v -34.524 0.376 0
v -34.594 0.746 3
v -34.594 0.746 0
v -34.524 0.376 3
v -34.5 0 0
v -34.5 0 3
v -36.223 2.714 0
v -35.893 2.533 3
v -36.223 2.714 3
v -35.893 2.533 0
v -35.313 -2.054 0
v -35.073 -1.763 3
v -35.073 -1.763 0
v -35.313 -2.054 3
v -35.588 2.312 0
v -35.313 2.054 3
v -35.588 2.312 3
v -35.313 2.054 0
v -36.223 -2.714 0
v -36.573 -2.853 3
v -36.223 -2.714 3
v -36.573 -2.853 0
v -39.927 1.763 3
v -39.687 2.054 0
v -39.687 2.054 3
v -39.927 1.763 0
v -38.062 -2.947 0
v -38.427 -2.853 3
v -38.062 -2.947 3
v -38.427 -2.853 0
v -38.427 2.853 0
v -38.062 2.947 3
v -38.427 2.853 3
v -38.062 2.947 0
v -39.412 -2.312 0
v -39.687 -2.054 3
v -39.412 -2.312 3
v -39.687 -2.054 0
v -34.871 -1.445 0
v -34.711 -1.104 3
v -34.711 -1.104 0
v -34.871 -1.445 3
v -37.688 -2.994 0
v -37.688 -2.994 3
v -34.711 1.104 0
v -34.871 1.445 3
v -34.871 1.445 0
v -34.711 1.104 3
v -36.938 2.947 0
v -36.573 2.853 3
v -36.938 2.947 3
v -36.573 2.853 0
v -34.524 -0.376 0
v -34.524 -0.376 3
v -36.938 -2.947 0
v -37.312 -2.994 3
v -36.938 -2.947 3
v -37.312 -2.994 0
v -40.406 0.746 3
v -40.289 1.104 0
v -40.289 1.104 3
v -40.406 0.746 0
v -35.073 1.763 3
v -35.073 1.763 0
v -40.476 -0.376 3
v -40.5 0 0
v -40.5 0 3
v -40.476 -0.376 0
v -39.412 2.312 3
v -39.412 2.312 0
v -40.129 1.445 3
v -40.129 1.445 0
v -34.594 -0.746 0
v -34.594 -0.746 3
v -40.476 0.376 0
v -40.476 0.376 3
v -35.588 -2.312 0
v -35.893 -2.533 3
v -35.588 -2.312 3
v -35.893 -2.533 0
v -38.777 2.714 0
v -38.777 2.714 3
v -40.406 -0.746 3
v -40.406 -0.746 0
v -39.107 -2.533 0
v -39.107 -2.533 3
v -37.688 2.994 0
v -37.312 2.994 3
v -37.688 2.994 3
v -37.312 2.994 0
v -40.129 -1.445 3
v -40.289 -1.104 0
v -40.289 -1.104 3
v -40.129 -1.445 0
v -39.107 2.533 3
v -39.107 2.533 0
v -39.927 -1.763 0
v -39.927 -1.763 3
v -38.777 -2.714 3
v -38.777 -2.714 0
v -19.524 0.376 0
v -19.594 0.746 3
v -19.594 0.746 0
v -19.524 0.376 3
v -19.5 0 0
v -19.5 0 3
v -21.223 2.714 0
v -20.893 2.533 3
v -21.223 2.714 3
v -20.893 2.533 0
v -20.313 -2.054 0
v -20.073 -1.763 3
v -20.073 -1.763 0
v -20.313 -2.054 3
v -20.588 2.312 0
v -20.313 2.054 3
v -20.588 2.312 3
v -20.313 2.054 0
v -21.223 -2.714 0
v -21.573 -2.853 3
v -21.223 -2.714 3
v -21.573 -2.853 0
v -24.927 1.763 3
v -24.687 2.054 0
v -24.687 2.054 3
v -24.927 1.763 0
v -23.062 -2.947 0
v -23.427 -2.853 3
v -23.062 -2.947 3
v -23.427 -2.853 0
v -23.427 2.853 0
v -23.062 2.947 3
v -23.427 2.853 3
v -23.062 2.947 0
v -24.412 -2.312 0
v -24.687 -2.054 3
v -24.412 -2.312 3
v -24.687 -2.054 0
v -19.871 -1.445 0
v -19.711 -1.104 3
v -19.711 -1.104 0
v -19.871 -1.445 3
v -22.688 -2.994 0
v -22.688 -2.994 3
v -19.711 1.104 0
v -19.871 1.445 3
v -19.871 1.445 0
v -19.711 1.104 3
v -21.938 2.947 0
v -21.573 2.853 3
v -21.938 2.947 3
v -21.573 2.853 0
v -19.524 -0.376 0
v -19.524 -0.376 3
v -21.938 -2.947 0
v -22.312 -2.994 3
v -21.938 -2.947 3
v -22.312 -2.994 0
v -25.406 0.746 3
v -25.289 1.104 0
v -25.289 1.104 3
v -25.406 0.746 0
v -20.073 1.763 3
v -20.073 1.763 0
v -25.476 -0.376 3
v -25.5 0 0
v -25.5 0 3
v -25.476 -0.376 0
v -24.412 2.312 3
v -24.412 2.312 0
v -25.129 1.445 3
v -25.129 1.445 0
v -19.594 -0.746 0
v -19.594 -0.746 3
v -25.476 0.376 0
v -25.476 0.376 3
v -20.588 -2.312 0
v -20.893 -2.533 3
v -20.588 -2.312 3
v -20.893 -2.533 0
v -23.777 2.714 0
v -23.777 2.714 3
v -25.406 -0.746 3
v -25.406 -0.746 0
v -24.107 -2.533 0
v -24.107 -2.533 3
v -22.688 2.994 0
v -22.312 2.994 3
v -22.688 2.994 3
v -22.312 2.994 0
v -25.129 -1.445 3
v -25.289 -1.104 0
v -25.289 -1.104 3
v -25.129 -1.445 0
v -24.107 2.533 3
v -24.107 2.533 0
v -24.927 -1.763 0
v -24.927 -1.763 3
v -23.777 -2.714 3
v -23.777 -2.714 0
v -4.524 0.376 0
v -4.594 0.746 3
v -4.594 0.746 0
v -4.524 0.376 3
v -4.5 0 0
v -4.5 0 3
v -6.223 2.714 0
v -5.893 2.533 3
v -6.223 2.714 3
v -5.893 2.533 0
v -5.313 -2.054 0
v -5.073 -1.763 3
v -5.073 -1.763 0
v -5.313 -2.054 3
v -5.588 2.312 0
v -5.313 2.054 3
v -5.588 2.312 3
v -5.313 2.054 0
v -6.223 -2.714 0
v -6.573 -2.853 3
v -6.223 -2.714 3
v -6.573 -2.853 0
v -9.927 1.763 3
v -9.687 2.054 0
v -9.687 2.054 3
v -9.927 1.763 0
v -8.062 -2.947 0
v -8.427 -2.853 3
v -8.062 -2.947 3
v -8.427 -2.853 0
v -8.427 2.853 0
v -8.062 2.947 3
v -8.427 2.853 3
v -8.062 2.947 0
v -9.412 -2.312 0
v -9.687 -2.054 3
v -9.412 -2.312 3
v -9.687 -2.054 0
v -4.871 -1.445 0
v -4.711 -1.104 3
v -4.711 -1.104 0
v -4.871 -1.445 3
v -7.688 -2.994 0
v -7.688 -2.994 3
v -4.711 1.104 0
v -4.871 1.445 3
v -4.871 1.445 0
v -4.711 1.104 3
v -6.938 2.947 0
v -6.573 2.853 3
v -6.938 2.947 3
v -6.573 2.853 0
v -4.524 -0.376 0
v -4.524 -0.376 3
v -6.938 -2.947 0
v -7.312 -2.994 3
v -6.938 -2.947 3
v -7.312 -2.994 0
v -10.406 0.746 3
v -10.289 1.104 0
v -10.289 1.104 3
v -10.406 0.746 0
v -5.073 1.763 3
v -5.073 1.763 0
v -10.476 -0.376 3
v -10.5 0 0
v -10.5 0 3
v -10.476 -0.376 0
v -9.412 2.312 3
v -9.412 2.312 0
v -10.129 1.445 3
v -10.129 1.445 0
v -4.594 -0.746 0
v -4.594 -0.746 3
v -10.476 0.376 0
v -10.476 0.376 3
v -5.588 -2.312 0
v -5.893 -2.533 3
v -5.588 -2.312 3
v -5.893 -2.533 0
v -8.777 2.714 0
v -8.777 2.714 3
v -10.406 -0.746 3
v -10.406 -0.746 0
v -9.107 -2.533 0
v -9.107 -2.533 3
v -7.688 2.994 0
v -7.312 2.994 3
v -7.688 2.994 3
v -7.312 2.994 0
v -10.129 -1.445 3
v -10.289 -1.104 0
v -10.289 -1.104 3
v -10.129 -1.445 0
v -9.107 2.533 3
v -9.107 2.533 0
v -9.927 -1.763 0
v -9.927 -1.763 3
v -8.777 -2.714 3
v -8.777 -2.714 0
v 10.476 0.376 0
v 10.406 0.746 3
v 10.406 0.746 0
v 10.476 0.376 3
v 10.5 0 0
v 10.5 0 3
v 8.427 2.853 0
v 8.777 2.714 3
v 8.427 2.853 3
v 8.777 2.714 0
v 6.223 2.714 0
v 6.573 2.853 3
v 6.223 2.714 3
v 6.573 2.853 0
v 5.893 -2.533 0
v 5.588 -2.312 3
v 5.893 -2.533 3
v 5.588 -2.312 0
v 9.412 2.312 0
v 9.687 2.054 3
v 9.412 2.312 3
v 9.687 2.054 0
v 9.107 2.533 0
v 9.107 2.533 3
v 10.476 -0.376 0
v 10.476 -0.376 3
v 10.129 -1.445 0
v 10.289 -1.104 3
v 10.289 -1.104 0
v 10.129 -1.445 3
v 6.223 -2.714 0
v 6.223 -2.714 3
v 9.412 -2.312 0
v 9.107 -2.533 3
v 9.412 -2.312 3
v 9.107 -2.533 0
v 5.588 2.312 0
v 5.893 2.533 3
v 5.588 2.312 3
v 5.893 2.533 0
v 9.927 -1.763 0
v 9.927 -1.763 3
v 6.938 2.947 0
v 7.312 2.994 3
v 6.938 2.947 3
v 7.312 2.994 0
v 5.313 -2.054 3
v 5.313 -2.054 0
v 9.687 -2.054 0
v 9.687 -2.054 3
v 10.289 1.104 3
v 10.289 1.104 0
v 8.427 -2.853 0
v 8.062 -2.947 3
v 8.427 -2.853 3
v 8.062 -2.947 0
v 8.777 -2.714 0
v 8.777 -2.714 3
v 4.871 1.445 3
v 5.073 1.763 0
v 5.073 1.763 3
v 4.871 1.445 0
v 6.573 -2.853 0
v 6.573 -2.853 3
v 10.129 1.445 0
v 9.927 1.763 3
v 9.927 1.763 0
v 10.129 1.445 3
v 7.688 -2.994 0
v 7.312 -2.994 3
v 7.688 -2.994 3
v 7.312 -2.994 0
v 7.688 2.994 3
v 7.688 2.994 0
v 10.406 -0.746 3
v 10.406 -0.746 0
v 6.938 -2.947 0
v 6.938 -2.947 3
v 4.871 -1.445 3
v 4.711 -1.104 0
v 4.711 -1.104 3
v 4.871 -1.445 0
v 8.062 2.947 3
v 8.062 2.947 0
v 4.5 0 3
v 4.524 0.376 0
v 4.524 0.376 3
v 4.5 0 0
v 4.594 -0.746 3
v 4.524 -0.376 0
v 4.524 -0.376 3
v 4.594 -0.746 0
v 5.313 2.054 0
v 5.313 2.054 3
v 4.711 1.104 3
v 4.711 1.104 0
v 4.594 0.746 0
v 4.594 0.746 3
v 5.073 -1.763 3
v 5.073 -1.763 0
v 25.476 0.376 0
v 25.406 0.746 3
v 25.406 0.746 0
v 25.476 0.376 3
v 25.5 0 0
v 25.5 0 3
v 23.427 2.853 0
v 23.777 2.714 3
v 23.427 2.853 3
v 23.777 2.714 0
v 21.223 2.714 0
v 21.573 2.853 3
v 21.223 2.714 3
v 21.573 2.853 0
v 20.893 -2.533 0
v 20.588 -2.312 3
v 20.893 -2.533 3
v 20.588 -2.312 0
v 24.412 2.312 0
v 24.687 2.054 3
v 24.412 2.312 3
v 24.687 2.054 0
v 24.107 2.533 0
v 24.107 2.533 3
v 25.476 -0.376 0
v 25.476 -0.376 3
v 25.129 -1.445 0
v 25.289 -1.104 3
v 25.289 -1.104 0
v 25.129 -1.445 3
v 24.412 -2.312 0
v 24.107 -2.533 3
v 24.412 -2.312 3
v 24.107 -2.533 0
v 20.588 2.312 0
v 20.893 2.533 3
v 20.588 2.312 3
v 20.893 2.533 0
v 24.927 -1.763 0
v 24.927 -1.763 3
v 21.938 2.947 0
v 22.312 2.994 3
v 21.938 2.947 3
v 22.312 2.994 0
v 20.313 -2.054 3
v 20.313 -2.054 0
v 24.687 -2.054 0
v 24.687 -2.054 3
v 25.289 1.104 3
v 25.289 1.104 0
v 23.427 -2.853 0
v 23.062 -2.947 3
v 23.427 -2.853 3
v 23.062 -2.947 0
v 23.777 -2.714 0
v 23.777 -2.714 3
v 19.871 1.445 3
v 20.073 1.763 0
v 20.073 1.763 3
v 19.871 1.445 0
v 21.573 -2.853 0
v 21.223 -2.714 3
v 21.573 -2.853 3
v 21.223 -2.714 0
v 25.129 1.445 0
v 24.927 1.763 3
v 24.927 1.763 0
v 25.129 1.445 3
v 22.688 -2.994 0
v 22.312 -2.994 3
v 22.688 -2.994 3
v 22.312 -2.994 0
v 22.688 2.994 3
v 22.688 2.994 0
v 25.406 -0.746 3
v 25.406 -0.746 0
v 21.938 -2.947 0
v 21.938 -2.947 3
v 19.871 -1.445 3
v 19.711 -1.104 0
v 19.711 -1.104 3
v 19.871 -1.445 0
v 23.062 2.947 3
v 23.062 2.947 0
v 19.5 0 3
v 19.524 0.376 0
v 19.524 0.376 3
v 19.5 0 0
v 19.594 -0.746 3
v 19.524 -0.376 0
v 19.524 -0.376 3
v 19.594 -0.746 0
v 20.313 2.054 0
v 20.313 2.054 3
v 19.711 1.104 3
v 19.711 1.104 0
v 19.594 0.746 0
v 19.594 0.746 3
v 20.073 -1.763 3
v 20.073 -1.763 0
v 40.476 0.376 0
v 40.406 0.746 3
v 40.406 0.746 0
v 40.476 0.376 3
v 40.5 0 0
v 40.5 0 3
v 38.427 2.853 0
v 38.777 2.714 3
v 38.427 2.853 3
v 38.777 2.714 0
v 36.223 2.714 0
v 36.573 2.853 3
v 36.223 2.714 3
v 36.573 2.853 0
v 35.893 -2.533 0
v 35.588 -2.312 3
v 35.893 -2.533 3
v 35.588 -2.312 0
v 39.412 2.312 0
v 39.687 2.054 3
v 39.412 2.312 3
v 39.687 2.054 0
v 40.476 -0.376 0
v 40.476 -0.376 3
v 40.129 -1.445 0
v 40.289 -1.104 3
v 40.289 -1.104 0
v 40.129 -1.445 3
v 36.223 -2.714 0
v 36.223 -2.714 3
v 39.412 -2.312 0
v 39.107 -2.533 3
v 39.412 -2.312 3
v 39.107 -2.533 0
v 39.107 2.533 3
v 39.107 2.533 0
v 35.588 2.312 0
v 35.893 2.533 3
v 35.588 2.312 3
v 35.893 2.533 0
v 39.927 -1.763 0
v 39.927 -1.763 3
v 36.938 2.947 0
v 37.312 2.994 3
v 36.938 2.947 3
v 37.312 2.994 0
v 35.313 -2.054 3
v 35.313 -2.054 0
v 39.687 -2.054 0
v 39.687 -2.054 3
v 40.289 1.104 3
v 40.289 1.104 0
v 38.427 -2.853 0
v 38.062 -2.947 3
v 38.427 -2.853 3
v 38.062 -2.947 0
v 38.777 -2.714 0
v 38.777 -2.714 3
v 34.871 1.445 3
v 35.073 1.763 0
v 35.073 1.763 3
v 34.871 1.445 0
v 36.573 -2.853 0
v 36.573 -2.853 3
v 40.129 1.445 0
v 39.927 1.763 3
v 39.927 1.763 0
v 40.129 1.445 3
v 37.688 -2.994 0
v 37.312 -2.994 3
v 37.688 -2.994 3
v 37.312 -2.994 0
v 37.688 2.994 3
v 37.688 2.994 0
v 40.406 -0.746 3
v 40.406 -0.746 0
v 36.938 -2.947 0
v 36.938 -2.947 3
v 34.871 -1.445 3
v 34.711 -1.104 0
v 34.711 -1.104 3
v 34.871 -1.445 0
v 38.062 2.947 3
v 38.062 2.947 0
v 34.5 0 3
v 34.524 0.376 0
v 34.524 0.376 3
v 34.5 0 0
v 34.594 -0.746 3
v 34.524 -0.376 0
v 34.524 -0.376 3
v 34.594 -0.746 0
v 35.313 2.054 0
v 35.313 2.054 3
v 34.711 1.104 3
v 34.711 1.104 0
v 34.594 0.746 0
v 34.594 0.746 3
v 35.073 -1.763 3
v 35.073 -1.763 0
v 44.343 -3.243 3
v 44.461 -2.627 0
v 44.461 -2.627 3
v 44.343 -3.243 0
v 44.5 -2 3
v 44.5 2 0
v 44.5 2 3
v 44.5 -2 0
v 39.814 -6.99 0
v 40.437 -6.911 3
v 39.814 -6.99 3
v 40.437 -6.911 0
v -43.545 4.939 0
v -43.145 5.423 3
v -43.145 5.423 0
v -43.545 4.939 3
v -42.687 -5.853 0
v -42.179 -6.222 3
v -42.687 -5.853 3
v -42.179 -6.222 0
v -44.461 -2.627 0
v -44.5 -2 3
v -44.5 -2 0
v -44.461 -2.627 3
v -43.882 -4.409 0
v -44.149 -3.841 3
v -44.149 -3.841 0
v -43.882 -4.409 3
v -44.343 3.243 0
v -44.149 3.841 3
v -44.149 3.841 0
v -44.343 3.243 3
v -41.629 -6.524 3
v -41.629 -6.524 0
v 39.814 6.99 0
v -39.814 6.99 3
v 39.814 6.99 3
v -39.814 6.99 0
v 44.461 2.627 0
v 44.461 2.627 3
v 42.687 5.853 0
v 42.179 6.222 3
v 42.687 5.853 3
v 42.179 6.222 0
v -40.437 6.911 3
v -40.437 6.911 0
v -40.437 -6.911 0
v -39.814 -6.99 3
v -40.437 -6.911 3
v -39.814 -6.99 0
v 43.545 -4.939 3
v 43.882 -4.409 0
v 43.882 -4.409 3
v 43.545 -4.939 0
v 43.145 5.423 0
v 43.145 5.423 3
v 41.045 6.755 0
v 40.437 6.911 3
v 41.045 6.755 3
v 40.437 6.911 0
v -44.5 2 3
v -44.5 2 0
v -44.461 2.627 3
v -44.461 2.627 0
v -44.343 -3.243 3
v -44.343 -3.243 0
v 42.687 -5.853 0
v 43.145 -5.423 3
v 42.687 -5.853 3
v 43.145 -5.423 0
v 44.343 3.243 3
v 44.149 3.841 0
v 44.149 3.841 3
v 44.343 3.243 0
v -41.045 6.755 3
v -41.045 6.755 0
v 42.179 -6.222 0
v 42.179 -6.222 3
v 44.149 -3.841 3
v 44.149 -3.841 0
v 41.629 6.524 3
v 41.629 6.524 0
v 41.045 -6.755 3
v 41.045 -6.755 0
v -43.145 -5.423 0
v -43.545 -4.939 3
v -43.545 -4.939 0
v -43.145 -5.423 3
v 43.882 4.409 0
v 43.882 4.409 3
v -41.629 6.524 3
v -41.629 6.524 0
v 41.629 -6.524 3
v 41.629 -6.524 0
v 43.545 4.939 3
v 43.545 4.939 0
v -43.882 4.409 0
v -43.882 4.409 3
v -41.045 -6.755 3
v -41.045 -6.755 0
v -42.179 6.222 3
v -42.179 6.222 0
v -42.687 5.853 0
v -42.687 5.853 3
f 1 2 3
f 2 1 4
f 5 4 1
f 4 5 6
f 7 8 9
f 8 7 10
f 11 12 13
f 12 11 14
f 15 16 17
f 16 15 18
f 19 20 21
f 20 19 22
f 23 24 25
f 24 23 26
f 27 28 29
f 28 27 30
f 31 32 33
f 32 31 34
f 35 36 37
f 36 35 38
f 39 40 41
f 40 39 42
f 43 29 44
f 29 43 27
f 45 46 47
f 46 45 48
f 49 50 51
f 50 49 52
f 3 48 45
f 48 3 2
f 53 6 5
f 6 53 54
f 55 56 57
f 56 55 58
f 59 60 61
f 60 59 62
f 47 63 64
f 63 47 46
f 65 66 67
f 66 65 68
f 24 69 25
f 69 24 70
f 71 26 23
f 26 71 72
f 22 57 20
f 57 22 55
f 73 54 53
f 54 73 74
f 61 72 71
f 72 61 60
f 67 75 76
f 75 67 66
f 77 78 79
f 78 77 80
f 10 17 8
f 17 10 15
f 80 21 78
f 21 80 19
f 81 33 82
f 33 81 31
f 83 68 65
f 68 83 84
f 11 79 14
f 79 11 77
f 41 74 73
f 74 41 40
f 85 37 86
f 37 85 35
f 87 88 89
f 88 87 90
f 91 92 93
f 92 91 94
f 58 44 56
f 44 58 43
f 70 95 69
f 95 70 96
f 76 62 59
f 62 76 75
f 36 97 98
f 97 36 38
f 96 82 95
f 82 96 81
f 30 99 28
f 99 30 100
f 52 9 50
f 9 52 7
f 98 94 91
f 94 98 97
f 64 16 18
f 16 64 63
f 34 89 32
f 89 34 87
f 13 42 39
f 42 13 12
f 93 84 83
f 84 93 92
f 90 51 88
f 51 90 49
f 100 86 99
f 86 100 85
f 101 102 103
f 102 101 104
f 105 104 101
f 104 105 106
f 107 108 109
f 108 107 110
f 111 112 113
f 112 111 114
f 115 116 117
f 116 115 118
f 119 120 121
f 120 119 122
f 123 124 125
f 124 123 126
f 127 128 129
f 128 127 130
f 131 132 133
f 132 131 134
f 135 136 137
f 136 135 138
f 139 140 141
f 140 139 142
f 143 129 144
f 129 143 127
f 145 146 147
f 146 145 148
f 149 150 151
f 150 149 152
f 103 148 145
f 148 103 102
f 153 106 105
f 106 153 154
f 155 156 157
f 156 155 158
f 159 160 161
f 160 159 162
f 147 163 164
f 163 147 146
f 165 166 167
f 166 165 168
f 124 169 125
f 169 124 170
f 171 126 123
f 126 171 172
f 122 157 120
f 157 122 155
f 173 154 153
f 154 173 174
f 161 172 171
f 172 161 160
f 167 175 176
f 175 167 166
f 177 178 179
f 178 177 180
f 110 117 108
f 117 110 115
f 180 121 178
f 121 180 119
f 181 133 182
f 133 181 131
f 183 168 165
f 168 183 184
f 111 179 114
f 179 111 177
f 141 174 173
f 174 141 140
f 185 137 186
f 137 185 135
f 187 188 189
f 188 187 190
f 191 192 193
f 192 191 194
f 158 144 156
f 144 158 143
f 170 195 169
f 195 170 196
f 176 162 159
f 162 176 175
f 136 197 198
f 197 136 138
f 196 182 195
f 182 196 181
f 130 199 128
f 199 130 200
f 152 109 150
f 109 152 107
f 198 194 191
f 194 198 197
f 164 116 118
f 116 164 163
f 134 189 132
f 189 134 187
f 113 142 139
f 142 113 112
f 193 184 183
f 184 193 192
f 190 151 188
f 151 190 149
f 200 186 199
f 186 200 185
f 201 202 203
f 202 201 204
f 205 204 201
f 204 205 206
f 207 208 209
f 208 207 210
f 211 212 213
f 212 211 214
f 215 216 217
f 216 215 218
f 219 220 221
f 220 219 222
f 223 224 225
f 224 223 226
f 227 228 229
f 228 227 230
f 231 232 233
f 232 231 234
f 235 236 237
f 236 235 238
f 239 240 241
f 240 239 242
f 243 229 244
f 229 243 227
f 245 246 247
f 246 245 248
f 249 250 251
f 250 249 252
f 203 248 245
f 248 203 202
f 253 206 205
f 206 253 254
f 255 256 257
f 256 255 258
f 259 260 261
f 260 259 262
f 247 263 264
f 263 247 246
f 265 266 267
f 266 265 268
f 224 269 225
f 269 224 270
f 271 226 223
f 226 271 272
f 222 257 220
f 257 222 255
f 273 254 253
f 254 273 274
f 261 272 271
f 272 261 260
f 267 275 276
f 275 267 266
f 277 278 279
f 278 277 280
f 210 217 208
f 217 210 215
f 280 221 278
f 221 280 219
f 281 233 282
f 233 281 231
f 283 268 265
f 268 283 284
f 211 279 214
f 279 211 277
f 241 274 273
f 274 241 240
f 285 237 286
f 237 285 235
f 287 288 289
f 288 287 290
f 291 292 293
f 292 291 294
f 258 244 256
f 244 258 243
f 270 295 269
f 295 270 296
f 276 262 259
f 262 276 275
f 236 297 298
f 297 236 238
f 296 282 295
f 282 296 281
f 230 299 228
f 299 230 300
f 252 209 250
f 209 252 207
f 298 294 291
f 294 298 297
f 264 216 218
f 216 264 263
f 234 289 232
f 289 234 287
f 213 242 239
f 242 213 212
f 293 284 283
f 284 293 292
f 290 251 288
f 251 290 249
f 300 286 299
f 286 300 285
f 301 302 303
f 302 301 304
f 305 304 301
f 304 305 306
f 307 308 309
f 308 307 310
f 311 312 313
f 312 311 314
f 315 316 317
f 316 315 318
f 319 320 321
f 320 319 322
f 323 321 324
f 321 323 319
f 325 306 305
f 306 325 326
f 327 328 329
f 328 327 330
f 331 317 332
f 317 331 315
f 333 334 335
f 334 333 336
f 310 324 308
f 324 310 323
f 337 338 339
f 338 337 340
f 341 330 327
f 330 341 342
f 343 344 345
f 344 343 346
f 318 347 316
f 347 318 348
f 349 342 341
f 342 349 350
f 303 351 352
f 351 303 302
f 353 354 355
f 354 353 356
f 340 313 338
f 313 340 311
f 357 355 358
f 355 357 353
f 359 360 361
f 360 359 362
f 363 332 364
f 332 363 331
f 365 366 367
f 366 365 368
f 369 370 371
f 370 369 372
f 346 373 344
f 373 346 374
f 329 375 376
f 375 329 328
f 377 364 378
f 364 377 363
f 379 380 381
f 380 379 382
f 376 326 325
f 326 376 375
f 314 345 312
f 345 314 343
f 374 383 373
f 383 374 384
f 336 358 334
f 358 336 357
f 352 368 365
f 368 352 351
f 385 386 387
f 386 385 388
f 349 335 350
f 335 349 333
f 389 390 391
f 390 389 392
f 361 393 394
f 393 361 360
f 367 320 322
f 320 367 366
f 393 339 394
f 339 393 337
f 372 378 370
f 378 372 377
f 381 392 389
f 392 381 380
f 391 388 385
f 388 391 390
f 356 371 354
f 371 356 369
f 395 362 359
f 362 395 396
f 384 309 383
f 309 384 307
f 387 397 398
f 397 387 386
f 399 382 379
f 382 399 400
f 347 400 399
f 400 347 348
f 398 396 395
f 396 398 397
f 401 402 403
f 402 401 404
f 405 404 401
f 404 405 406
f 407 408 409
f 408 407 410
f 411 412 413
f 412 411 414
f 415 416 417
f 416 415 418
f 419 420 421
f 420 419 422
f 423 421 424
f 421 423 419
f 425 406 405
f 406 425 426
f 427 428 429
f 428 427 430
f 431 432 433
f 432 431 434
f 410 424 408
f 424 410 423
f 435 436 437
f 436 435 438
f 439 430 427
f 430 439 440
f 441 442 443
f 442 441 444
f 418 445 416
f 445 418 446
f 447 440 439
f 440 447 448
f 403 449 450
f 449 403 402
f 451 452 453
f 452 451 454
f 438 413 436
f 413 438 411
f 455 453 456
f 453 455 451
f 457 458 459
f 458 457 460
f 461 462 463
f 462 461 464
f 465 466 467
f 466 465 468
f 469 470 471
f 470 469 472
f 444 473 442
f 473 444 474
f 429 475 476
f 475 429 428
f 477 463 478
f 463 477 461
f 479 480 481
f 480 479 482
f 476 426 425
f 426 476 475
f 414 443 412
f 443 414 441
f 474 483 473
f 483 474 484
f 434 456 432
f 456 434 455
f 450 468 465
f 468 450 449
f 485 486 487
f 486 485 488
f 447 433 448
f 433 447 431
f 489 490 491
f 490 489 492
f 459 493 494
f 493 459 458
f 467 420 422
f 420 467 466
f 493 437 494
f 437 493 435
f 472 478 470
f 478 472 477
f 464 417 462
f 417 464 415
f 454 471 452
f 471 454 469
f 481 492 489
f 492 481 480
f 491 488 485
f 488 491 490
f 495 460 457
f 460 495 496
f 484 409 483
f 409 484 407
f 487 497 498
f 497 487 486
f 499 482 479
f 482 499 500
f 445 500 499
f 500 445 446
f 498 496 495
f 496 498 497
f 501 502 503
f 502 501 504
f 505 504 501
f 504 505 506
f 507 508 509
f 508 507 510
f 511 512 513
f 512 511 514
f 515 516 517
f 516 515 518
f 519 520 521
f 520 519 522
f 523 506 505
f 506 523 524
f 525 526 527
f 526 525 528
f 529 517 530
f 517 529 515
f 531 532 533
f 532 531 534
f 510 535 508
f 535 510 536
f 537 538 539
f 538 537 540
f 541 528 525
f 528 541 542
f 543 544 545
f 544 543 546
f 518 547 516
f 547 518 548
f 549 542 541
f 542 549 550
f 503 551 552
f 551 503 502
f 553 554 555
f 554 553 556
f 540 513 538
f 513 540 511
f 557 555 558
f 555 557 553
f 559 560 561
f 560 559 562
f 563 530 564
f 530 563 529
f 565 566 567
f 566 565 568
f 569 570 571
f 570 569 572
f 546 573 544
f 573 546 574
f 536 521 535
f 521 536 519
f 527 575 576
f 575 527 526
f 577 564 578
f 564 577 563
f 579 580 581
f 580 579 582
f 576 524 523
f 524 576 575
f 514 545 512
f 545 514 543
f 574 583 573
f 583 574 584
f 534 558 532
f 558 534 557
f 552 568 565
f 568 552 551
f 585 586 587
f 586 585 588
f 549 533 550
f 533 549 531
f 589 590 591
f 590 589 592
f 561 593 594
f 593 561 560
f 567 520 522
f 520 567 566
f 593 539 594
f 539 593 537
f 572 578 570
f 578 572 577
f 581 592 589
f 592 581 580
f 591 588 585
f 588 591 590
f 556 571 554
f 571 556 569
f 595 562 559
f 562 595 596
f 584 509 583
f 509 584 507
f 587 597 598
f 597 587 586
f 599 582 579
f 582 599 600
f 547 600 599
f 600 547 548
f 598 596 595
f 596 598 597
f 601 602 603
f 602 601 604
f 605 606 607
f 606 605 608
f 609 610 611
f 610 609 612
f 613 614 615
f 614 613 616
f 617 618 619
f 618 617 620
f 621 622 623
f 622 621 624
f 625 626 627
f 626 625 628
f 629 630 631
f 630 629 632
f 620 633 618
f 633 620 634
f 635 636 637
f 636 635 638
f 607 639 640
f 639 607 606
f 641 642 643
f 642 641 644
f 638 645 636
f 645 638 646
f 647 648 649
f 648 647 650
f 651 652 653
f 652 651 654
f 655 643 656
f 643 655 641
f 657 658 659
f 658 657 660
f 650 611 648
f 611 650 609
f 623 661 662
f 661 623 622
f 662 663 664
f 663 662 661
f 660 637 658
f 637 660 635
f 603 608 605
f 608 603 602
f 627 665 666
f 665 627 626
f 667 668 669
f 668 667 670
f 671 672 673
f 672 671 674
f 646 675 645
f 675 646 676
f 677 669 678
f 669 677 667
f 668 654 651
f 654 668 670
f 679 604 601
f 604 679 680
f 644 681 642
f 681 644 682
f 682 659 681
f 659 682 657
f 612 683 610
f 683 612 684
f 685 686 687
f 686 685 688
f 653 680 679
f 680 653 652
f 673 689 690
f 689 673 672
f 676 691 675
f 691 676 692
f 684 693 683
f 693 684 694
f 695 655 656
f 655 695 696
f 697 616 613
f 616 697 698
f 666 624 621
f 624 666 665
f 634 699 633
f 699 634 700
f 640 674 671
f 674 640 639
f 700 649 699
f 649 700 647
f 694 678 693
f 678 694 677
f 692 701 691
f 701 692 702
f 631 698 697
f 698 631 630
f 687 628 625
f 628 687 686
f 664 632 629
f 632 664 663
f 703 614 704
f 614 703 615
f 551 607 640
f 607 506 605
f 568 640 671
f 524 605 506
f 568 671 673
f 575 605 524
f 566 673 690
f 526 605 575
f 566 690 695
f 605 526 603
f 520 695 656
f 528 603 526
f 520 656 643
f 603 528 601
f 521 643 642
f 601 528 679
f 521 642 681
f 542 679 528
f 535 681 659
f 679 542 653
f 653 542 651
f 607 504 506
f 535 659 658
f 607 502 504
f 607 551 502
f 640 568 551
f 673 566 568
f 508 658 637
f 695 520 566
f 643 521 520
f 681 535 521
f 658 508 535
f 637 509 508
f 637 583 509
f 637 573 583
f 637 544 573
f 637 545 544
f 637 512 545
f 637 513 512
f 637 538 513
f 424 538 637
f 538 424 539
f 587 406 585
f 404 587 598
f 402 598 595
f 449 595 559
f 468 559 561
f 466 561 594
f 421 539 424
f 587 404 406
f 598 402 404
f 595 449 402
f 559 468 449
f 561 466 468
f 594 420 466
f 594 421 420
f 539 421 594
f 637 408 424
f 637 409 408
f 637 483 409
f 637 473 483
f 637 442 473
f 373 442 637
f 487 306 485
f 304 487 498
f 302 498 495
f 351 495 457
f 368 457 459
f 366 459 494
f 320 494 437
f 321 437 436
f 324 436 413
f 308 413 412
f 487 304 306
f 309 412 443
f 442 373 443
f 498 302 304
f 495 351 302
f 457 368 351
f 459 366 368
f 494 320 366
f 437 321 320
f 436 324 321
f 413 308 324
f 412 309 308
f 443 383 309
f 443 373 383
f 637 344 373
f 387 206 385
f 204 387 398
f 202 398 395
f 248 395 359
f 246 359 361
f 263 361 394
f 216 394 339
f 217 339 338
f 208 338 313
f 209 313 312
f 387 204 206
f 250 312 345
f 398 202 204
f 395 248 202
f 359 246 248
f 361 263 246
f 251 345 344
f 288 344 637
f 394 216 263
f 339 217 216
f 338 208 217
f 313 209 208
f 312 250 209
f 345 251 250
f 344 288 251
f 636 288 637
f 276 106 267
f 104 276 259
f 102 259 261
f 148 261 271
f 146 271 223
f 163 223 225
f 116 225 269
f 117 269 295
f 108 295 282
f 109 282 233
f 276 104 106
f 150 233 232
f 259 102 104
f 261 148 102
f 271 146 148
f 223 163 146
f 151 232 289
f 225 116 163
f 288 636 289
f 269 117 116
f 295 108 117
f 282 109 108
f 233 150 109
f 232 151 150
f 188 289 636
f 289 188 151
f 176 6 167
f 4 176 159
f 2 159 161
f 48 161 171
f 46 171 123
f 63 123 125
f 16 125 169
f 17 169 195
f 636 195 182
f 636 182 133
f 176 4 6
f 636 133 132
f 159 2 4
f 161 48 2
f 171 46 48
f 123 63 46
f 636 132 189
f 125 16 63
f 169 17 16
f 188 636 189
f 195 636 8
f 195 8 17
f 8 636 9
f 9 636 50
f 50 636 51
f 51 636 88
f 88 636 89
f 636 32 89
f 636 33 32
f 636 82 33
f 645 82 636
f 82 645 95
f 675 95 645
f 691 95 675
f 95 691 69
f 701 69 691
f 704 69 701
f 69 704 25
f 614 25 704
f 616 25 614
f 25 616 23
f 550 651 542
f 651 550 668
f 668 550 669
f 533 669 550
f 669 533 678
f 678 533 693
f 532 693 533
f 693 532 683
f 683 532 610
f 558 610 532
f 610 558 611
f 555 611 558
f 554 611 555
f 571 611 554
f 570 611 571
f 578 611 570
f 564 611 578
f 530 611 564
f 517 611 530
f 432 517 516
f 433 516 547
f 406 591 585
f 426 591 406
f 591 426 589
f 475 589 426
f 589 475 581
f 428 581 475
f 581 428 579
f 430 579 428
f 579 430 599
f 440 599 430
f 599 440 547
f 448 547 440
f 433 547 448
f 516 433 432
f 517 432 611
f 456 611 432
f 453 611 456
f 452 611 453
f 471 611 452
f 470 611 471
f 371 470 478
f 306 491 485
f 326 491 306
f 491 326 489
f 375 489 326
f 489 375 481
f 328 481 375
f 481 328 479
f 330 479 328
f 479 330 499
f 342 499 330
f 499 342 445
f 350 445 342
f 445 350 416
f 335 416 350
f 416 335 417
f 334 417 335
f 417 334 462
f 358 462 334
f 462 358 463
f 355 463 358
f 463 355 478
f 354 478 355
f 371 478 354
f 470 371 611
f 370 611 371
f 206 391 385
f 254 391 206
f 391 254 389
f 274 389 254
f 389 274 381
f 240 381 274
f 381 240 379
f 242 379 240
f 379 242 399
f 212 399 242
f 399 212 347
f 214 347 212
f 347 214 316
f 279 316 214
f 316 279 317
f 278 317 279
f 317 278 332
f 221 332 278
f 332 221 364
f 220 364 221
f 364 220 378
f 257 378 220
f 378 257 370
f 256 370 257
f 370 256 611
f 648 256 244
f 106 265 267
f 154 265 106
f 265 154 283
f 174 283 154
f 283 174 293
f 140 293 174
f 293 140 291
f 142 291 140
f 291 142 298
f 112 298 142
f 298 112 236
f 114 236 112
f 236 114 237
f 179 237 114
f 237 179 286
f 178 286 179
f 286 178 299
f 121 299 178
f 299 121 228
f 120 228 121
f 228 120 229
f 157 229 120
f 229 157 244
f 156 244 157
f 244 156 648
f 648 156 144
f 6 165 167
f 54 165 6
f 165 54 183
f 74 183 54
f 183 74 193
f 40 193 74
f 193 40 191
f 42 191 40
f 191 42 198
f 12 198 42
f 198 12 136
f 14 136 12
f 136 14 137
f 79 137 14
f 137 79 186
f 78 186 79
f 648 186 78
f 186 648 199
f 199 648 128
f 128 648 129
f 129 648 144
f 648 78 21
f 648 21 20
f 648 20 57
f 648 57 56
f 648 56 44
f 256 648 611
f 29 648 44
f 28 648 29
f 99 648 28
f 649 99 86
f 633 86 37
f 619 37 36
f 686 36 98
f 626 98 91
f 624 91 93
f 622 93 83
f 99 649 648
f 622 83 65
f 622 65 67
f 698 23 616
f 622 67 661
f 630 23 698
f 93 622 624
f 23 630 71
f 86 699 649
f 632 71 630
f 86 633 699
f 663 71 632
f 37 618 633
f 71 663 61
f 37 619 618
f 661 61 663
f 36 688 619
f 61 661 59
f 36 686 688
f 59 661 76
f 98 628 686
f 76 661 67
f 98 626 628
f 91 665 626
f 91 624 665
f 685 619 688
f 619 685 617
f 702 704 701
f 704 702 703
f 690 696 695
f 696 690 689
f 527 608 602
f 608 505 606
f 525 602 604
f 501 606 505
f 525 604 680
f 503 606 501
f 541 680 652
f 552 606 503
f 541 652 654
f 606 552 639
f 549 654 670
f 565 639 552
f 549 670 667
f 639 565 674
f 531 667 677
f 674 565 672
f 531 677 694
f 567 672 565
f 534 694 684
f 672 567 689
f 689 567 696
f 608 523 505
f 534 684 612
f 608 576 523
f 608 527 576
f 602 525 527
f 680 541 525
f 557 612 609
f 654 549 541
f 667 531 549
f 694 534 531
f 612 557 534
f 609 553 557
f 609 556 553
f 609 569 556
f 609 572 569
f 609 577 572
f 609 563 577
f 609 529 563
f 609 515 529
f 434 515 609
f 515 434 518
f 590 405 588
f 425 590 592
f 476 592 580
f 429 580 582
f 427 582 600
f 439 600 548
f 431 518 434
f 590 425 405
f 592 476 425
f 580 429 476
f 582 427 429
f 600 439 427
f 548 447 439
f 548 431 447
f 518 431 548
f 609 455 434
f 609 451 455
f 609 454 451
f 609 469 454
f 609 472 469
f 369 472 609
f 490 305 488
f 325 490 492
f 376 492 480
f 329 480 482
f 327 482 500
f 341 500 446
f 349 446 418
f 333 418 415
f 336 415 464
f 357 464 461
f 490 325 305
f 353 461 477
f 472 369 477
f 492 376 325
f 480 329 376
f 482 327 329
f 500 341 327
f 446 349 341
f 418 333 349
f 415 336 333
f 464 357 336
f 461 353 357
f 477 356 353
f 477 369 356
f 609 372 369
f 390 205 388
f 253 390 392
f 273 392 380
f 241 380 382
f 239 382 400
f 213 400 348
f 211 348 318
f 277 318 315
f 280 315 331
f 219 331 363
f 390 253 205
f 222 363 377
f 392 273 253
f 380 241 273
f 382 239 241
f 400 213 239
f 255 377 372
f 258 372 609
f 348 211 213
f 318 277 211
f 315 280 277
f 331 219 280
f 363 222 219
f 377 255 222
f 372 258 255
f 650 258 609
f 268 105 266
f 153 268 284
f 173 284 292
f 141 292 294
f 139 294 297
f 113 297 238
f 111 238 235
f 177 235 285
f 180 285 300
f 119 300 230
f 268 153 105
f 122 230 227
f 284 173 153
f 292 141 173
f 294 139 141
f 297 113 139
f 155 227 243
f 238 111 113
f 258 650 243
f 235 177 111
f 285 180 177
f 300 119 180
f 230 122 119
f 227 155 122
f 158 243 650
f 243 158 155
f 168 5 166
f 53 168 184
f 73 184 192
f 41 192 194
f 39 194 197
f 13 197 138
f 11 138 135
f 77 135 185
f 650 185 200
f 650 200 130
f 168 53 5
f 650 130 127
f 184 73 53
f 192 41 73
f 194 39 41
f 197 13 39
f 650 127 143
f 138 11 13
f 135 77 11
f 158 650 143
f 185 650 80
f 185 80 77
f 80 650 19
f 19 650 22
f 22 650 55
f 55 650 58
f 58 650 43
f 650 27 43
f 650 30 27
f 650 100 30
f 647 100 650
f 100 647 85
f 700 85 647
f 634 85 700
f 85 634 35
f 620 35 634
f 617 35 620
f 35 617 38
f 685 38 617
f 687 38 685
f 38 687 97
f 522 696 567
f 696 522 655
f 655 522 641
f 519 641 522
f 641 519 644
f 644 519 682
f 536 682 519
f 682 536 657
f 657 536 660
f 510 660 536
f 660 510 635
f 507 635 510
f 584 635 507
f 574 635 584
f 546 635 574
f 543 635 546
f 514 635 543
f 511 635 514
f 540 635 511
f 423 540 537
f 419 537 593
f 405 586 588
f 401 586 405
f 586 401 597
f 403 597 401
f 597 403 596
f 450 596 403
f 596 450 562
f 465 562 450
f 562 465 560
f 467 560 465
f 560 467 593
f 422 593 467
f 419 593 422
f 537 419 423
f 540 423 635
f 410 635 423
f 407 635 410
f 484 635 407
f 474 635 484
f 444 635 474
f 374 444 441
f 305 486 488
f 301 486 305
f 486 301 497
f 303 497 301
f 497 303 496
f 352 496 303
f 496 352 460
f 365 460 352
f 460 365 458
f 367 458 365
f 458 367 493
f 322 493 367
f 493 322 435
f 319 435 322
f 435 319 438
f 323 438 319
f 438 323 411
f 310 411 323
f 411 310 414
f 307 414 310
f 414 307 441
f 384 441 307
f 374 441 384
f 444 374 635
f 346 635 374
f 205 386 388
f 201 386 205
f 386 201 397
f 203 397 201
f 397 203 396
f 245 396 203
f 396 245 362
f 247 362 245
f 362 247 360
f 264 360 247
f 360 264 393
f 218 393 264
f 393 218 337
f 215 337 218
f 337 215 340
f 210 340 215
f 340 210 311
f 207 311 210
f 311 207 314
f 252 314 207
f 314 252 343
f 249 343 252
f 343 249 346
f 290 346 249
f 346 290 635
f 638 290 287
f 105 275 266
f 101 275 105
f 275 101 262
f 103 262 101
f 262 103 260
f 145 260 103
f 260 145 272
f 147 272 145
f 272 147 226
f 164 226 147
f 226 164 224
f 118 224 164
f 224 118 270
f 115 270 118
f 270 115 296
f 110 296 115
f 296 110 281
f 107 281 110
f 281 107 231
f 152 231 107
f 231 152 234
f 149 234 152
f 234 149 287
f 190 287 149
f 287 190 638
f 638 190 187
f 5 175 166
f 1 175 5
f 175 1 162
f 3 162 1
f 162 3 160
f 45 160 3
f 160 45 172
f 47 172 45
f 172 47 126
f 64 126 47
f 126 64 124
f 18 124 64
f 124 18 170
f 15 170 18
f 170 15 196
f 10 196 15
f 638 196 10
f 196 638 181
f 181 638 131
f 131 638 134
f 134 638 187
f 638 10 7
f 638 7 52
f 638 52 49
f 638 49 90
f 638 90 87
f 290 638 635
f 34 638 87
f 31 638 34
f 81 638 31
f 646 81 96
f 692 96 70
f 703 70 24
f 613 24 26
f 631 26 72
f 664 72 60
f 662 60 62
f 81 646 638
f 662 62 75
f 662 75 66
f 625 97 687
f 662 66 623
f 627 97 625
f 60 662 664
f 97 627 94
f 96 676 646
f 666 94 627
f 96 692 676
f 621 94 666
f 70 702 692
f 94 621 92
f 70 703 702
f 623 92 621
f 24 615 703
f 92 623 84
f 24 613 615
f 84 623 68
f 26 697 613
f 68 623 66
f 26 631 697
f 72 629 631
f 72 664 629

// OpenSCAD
$fn = 50;


difference() {
	union() {
		hull() {
			translate(v = [-39.5000000000, 2.0000000000, 0]) {
				cylinder(h = 3, r = 5);
			}
			translate(v = [39.5000000000, 2.0000000000, 0]) {
				cylinder(h = 3, r = 5);
			}
			translate(v = [-39.5000000000, -2.0000000000, 0]) {
				cylinder(h = 3, r = 5);
			}
			translate(v = [39.5000000000, -2.0000000000, 0]) {
				cylinder(h = 3, r = 5);
			}
		}
	}
	union() {
		translate(v = [-37.5000000000, 0.0000000000, 0]) {
			translate(v = [0, 0, -100]) {
				cylinder(h = 200, r = 3.0000000000);
			}
		}
		translate(v = [-22.5000000000, 0.0000000000, 0]) {
			translate(v = [0, 0, -100]) {
				cylinder(h = 200, r = 3.0000000000);
			}
		}
		translate(v = [-7.5000000000, 0.0000000000, 0]) {
			translate(v = [0, 0, -100]) {
				cylinder(h = 200, r = 3.0000000000);
			}
		}
		translate(v = [7.5000000000, 0.0000000000, 0]) {
			translate(v = [0, 0, -100]) {
				cylinder(h = 200, r = 3.0000000000);
			}
		}
		translate(v = [22.5000000000, 0.0000000000, 0]) {
			translate(v = [0, 0, -100]) {
				cylinder(h = 200, r = 3.0000000000);
			}
		}
		translate(v = [37.5000000000, 0.0000000000, 0]) {
			translate(v = [0, 0, -100]) {
				cylinder(h = 200, r = 3.0000000000);
			}
		}
	}
}
